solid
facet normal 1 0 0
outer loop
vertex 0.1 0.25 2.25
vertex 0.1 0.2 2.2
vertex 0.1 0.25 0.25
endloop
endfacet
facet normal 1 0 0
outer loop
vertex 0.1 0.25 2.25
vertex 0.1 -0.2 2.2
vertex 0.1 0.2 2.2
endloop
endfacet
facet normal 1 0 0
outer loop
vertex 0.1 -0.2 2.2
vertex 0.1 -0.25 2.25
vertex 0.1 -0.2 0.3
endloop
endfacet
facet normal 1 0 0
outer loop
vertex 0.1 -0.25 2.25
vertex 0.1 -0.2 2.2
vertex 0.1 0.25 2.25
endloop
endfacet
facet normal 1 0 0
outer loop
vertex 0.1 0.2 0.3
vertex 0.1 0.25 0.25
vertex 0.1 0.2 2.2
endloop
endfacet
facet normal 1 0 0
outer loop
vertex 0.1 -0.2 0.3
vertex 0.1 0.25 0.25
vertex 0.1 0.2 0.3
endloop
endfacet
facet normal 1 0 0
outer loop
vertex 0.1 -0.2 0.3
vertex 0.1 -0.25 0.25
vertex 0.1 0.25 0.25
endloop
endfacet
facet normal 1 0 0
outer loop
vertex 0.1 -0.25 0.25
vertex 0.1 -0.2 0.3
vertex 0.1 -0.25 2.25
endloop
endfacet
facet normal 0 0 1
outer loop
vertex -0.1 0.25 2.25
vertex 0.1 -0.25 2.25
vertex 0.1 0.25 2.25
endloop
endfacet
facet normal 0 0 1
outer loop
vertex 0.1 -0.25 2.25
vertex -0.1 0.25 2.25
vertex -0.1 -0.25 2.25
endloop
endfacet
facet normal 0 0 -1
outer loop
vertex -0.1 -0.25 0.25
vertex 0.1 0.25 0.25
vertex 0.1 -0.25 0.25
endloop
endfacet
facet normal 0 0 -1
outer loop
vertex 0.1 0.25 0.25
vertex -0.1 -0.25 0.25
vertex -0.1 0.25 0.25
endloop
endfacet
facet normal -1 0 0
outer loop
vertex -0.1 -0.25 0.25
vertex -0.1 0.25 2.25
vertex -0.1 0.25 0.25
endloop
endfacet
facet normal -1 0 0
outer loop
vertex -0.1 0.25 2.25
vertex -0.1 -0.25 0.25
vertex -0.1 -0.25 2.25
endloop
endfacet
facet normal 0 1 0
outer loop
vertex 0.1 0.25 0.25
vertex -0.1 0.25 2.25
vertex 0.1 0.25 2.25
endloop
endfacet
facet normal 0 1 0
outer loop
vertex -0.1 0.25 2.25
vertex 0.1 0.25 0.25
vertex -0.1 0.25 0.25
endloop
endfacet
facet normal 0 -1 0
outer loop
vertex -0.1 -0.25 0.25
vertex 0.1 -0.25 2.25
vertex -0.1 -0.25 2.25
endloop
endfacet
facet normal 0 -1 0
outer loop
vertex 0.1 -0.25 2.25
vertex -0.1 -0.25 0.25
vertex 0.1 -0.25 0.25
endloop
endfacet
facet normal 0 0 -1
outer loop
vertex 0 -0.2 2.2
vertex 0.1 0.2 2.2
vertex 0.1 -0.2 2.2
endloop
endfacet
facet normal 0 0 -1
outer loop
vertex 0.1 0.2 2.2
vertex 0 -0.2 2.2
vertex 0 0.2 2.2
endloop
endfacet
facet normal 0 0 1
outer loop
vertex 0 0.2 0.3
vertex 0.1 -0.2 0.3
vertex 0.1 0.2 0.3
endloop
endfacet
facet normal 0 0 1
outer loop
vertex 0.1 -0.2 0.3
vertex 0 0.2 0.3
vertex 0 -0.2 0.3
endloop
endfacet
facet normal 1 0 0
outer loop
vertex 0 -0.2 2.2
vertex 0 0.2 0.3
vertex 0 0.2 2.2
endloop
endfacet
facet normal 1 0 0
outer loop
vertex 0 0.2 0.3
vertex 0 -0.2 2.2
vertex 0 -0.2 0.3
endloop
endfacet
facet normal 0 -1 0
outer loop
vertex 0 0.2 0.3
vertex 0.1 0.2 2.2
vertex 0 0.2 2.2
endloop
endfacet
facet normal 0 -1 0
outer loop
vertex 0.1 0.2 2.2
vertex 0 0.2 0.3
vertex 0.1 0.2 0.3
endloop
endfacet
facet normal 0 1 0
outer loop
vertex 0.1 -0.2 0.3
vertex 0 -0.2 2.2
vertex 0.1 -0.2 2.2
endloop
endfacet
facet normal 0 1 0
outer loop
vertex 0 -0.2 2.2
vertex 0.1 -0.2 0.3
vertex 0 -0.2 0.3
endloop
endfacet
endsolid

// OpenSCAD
use <lib.scad>

hd=64;
ld=32;
vld=8;

module pipe() {
	rotate([180/$fn,0,0]) rotate([0,90,0]) cyl(0.4, 0.4, 1.0);
}

module meterHD() {
	translate([0,0,1.25]) difference() {
		rbox([0.2,0.5,2],0.01, $fn=6);
		translate([0.1,0,0]) box([0.2,0.4,1.9]);
	}
}

module meterLD() {
	translate([0,0,1.25]) difference() {
		box([0.2,0.5,2]);
		translate([0.1,0,0]) box([0.2,0.4,1.9]);
	}
}

module tankHD($fn=hd) {
	union() {
		difference() {
			translate([0,0,-2]) intersection() {
				translate([0,0,0.25]) sphere(r=5);
				cyl(2.45,2.45,10);
				translate([0,0,3.5]) box([5,5,3]);
			}
			translate([0,0,-1.8]) scale([0.95,0.95,0.95]) intersection() {
				translate([0,0,0.25]) sphere(r=5);
				cyl(2.45,2.45,10);
				translate([0,0,3.5]) box([5,5,3]);
			}
		}
//		translate([2,0,0.5]) rotate([0,0,0]) pipe();
//		translate([0,2,0.5]) rotate([0,0,90]) pipe();
//		translate([-2,0,0.5]) rotate([0,0,0]) pipe();
//		translate([0,-2,0.5]) rotate([0,0,90]) pipe();
	}
}

module tankLD($fn=ld) {
	union() {
		difference() {
			translate([0,0,-2]) intersection() {
				translate([0,0,0.25]) sphere(r=5);
				cyl(2.45,2.45,10);
				translate([0,0,3.5]) box([5,5,3]);
			}
			translate([0,0,-1.8]) scale([0.95,0.95,0.95]) intersection() {
				translate([0,0,0.25]) sphere(r=5);
				cyl(2.45,2.45,10);
				translate([0,0,3.5]) box([5,5,3]);
			}
		}
	}
}

module tankVLD($fn=vld) {
	difference() {
		translate([0,0,-2]) intersection() {
			translate([0,0,0.25]) sphere(r=5);
			cyl(2.5,2.5,10);
			translate([0,0,3.5]) box([5,5,3]);
		}
		translate([0,0,-1.975]) scale([0.99,0.99,0.99]) intersection() {
			translate([0,0,0.25]) sphere(r=5);
			cyl(2.5,2.5,10);
			translate([0,0,3.5]) box([5,5,3]);
		}
	}
}

module tankFluid($fn=ld) {
	#translate([0,0,1.27]) cyl(2.45,2.45,2.5);
}

module tank2() {
	translate([0,0,-2]) union() {
		intersection() {
			translate([0,0,-7]) sphere(r=12);
			cyl(4,4,10);
			translate([0,0,3.5]) box([8,8,3]);
		}
		if ($fn >= ld) for (i = [0:1:2])
			translate([0,0,3.95-(i*0.8)]) difference() {
				cyl(4.03,4.03,0.1);
				cyl(3.99,3.99,0.2);
			}
	}
}


//tank2($fn=12);
//tankHD();
//meterHD();
//tankLD();
meterLD();
//tankFluid();
